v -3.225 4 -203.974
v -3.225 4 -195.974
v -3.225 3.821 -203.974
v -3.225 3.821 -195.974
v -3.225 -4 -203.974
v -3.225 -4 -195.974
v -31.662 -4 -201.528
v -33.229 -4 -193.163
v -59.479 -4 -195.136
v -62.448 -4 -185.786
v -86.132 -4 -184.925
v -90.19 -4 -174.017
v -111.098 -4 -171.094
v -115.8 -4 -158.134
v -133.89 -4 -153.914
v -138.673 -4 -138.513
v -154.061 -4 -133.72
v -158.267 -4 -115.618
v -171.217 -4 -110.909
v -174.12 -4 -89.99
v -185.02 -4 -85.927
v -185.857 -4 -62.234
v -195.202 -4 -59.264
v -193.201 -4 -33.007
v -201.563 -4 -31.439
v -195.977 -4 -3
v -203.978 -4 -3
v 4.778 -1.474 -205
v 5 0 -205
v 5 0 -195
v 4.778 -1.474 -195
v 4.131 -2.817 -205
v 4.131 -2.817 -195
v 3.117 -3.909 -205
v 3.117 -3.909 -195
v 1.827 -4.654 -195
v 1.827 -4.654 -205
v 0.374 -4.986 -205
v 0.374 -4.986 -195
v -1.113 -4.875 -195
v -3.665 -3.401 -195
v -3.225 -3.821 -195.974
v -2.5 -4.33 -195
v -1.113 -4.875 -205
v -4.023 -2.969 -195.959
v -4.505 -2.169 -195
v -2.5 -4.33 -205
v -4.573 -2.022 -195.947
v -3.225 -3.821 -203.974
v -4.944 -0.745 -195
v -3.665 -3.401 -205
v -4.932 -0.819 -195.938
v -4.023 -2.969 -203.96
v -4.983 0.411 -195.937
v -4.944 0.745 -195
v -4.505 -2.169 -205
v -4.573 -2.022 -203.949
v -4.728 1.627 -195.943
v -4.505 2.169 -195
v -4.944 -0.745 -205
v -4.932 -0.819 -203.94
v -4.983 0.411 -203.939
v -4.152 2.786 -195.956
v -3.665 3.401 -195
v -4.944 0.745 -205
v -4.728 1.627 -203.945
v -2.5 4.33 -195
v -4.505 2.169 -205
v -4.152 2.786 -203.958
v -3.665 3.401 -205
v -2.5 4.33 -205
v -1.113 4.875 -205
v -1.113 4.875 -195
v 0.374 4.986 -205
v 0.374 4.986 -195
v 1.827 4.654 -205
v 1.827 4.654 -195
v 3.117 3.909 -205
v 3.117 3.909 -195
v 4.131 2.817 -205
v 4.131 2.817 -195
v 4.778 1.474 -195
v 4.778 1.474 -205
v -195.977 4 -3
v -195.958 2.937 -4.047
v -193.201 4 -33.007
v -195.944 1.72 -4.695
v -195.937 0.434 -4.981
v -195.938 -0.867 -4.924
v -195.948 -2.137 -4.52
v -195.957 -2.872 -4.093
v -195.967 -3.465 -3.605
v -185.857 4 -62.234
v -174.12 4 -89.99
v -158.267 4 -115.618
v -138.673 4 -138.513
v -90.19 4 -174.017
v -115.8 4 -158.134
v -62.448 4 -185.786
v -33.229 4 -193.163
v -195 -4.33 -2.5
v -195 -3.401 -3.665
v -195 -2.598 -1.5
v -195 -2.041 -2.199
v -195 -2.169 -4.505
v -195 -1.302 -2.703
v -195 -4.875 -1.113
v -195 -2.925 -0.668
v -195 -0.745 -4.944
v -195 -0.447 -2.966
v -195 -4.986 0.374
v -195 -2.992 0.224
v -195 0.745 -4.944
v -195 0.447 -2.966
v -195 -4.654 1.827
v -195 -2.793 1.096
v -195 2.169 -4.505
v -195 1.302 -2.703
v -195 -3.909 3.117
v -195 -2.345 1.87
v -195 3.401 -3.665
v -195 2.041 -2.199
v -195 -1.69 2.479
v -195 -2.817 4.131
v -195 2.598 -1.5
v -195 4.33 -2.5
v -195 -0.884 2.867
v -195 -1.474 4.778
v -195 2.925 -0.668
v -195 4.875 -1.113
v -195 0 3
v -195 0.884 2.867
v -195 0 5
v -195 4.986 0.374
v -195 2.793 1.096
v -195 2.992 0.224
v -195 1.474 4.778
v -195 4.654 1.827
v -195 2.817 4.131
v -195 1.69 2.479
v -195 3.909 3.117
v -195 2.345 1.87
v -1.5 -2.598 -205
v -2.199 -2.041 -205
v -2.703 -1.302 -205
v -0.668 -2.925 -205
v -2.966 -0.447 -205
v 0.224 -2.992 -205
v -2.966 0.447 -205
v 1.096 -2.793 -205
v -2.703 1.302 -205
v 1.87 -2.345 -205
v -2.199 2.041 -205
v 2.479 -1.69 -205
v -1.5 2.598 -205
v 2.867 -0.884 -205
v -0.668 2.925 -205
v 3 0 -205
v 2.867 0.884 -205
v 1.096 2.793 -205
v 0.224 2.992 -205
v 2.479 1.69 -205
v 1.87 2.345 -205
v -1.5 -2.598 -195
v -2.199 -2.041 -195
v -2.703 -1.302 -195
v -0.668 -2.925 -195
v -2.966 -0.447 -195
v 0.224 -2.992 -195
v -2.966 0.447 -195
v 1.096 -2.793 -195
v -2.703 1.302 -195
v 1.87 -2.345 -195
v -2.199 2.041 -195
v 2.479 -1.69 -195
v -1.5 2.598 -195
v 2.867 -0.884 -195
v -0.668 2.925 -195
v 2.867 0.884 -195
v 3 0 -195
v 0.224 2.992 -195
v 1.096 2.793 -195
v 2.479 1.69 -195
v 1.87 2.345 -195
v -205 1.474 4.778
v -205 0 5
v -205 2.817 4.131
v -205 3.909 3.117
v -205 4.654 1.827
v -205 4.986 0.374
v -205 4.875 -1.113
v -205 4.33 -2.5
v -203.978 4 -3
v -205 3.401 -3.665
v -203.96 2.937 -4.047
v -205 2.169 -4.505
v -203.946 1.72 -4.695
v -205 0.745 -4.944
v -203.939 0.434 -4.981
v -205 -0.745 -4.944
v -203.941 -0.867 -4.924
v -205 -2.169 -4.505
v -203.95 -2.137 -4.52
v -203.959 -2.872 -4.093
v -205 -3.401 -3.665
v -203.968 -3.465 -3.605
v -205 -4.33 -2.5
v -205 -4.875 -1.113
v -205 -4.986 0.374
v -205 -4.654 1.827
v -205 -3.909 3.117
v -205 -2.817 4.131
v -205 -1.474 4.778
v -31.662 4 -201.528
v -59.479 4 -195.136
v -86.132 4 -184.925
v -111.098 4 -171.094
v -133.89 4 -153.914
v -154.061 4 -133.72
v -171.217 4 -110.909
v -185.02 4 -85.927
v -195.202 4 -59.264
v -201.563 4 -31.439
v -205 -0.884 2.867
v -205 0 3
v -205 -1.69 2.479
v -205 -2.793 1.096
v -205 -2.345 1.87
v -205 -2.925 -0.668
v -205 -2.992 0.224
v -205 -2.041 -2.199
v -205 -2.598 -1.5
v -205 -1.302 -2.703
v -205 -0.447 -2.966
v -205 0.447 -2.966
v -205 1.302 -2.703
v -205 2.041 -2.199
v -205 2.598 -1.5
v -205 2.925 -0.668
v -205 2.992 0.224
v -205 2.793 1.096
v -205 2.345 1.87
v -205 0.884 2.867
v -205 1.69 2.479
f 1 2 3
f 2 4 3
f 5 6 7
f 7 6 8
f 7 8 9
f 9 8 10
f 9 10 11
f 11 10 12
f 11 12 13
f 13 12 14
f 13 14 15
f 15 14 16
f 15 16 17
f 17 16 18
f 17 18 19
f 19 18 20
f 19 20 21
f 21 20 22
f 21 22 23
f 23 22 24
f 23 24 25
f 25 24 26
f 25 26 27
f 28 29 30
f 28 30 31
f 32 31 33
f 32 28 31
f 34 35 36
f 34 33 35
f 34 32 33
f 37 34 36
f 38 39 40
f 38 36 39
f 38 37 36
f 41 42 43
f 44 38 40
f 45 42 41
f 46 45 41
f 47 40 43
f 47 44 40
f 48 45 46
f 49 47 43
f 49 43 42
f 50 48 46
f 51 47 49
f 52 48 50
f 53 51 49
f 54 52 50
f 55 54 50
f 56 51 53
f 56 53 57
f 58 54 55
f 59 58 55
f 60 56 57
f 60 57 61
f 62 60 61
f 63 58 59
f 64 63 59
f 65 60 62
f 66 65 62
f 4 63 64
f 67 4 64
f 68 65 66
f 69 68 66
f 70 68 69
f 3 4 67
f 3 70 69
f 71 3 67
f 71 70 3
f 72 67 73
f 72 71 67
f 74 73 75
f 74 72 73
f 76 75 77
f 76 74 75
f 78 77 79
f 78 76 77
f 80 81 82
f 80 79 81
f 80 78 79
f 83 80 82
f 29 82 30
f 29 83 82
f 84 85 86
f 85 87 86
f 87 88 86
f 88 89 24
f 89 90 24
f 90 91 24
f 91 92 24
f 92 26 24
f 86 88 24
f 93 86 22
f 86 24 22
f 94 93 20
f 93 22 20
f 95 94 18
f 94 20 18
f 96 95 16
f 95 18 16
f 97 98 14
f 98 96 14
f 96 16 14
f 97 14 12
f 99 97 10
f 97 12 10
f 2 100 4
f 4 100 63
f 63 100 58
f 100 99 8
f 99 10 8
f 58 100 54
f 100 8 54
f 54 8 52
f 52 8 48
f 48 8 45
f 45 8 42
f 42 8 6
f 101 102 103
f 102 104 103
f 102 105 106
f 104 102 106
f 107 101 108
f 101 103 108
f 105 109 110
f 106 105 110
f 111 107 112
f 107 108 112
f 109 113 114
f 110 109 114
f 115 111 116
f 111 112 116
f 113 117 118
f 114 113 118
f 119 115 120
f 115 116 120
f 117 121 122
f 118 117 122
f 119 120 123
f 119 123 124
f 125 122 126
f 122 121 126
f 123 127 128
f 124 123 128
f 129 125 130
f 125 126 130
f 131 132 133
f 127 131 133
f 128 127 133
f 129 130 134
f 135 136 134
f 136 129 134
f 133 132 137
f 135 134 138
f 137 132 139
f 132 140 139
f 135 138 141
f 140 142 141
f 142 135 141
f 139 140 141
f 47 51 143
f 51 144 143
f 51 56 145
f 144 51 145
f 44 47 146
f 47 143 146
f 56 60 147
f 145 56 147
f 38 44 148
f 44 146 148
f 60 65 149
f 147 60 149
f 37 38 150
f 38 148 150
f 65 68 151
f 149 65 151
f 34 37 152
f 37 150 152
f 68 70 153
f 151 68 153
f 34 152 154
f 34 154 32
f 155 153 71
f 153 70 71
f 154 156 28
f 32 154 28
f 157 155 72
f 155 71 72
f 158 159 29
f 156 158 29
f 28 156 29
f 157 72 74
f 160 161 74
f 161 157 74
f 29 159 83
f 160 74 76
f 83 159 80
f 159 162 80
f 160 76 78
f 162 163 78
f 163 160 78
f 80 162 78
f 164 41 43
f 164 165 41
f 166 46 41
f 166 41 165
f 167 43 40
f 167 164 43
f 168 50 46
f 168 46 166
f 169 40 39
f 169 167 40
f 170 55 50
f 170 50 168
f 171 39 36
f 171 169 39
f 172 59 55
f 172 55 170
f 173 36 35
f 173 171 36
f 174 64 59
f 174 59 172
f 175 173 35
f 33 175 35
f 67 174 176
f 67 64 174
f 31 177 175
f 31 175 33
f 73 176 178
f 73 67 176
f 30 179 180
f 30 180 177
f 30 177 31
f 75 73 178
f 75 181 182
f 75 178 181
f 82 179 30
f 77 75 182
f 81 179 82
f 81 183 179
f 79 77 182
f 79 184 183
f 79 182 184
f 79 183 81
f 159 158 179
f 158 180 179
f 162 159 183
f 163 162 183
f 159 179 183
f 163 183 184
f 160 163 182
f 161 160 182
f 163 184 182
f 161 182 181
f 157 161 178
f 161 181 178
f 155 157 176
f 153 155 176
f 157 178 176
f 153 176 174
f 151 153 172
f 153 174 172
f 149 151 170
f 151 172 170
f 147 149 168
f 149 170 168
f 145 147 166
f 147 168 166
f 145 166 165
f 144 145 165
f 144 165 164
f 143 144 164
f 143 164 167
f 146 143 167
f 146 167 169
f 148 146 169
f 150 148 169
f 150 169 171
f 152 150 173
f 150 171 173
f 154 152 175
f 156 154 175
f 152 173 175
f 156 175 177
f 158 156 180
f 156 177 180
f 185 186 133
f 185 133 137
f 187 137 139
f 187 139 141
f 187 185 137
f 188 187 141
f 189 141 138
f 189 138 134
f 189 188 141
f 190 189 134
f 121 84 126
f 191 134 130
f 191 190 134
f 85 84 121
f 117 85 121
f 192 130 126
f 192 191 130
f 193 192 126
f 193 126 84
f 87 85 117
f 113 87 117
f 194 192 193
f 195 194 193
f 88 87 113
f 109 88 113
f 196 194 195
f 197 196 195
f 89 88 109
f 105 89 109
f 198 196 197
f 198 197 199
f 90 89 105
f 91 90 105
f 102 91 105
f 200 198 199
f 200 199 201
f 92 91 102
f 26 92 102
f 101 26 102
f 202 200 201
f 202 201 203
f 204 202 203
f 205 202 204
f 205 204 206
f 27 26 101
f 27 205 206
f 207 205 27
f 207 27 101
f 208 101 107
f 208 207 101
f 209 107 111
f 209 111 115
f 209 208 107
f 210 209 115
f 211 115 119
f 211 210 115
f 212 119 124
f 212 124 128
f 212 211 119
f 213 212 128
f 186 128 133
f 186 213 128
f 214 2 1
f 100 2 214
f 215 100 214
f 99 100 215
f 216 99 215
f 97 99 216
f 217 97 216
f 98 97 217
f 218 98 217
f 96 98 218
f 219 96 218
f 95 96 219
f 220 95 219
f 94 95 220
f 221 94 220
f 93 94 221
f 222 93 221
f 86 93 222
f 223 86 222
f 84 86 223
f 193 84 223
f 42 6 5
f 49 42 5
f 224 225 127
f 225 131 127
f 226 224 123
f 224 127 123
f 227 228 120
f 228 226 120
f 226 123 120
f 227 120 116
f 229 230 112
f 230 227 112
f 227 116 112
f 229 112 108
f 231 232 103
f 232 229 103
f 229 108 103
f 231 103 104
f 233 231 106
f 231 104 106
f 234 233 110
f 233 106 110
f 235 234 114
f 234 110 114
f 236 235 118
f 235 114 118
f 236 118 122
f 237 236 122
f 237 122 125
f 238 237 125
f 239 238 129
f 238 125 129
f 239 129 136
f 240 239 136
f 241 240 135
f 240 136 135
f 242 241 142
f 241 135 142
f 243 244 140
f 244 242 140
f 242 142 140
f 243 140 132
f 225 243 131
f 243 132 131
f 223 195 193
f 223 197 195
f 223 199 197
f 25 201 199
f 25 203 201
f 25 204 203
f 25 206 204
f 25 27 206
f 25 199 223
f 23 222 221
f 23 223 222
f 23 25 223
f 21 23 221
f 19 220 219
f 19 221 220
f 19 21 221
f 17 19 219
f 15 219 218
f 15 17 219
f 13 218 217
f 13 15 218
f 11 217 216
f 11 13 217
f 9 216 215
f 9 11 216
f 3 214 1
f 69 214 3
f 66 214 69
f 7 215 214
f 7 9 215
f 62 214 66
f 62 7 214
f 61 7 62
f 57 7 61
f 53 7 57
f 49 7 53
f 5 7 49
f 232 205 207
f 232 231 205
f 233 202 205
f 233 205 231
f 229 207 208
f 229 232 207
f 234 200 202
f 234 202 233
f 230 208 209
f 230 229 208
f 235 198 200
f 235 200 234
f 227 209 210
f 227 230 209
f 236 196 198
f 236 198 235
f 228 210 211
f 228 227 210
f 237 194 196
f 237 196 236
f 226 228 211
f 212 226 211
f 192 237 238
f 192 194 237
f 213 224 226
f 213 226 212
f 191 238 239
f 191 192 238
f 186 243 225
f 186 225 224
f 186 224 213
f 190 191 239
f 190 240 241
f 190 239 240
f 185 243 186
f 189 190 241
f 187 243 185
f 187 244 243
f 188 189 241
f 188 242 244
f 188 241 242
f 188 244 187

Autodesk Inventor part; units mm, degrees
ref_plane "YZ Plane" through (0, 0, 0) normal (1, 0, 0) x (0, 1, 0)
ref_plane "XZ Plane" through (0, 0, 0) normal (0, 1, 0) x (-1, 0, 0)
ref_plane "XY Plane" through (0, 0, 0) normal (0, 0, 1) x (1, 0, 0)
sketch "スケッチ1" plane through (0, 0, 0) normal (0, 1, 0) x (-1, 0, 0)
  line L0 (0, -149.7212) -> (0, 30.7869) projected
  line L1 (-30.7969, 0) -> (149.7814, 0) projected
  arc A0 (3.2253, -195.9735) -> (195.977, -3) centre (0, 0) ccw
  arc A1 (3.2253, -203.9745) -> (203.9779, -3) centre (0, 0) ccw
  line L2 (195, 3) -> (195, 5)
  line L3 (195, 5) -> (205, 5)
  line L4 (205, 5) -> (205, 3)
  line L5 (205, 3) -> (195, 3)
  line L6 (203.9779, -3) -> (195.977, -3)
  line L7 (-3, -195) -> (-5, -195)
  line L8 (-5, -195) -> (-5, -205)
  line L9 (-5, -205) -> (-3, -205)
  line L10 (-3, -205) -> (-3, -195)
  line L11 (3.2253, -195.9735) -> (3.2253, -203.9745)
  dimension "d0" = 204
  dimension "d1" = 196
  dimension "d2" = 205
  dimension "d3" = 195
  dimension "d4" = 5
  dimension "d5" = 3
  dimension "d6" = 195
  dimension "d7" = 205
  dimension "d8" = 5
  dimension "d9" = 3
  dimension "d14" = 3
  dimension "d15" = 3.2253
extrude "押し出し1" add sketch "スケッチ1" along normal mid plane 8 contours A0 L6 A1 L11
revolve "回転1" add sketch "スケッチ1" angle 360 about axis through (0, 0, 0) along (-1, 0, 0) contours L2 L3 L4 L5
revolve "回転2" add sketch "スケッチ1" angle 360 about axis through (0, 0, 0) along (0, 0, 1) contours L10 L9 L8 L7
equation "\"d0\" = FrameRadius + 0.5 * FrameThickness"
equation "\"d1\" = FrameRadius - 0.5 * FrameThickness"
equation "\"d2\" = FrameRadius + 0.5 * BossLength"
equation "\"d3\" = FrameRadius - 0.5 * BossLength"
equation "\"d4\" = BossRadius"
equation "\"d5\" = BossHoleRadius"
equation "\"d6\" = FrameRadius - 0.5 * BossLength"
equation "\"d7\" = FrameRadius + 0.5 * BossLength"
equation "\"d8\" = BossRadius"
equation "\"d9\" = BossHoleRadius"
equation "\"d14\" = BossHoleRadius"
equation "\"d10\" = FrameThickness"
equation "\"FrameThickness\" = 8"
equation "\"BossRadius\" = 5"
equation "\"BossHoleRadius\" = 3"
equation "\"FrameRadius\" = 200"
equation "\"BossLength\" = 10"
properties part number "ArcFrameRa"
